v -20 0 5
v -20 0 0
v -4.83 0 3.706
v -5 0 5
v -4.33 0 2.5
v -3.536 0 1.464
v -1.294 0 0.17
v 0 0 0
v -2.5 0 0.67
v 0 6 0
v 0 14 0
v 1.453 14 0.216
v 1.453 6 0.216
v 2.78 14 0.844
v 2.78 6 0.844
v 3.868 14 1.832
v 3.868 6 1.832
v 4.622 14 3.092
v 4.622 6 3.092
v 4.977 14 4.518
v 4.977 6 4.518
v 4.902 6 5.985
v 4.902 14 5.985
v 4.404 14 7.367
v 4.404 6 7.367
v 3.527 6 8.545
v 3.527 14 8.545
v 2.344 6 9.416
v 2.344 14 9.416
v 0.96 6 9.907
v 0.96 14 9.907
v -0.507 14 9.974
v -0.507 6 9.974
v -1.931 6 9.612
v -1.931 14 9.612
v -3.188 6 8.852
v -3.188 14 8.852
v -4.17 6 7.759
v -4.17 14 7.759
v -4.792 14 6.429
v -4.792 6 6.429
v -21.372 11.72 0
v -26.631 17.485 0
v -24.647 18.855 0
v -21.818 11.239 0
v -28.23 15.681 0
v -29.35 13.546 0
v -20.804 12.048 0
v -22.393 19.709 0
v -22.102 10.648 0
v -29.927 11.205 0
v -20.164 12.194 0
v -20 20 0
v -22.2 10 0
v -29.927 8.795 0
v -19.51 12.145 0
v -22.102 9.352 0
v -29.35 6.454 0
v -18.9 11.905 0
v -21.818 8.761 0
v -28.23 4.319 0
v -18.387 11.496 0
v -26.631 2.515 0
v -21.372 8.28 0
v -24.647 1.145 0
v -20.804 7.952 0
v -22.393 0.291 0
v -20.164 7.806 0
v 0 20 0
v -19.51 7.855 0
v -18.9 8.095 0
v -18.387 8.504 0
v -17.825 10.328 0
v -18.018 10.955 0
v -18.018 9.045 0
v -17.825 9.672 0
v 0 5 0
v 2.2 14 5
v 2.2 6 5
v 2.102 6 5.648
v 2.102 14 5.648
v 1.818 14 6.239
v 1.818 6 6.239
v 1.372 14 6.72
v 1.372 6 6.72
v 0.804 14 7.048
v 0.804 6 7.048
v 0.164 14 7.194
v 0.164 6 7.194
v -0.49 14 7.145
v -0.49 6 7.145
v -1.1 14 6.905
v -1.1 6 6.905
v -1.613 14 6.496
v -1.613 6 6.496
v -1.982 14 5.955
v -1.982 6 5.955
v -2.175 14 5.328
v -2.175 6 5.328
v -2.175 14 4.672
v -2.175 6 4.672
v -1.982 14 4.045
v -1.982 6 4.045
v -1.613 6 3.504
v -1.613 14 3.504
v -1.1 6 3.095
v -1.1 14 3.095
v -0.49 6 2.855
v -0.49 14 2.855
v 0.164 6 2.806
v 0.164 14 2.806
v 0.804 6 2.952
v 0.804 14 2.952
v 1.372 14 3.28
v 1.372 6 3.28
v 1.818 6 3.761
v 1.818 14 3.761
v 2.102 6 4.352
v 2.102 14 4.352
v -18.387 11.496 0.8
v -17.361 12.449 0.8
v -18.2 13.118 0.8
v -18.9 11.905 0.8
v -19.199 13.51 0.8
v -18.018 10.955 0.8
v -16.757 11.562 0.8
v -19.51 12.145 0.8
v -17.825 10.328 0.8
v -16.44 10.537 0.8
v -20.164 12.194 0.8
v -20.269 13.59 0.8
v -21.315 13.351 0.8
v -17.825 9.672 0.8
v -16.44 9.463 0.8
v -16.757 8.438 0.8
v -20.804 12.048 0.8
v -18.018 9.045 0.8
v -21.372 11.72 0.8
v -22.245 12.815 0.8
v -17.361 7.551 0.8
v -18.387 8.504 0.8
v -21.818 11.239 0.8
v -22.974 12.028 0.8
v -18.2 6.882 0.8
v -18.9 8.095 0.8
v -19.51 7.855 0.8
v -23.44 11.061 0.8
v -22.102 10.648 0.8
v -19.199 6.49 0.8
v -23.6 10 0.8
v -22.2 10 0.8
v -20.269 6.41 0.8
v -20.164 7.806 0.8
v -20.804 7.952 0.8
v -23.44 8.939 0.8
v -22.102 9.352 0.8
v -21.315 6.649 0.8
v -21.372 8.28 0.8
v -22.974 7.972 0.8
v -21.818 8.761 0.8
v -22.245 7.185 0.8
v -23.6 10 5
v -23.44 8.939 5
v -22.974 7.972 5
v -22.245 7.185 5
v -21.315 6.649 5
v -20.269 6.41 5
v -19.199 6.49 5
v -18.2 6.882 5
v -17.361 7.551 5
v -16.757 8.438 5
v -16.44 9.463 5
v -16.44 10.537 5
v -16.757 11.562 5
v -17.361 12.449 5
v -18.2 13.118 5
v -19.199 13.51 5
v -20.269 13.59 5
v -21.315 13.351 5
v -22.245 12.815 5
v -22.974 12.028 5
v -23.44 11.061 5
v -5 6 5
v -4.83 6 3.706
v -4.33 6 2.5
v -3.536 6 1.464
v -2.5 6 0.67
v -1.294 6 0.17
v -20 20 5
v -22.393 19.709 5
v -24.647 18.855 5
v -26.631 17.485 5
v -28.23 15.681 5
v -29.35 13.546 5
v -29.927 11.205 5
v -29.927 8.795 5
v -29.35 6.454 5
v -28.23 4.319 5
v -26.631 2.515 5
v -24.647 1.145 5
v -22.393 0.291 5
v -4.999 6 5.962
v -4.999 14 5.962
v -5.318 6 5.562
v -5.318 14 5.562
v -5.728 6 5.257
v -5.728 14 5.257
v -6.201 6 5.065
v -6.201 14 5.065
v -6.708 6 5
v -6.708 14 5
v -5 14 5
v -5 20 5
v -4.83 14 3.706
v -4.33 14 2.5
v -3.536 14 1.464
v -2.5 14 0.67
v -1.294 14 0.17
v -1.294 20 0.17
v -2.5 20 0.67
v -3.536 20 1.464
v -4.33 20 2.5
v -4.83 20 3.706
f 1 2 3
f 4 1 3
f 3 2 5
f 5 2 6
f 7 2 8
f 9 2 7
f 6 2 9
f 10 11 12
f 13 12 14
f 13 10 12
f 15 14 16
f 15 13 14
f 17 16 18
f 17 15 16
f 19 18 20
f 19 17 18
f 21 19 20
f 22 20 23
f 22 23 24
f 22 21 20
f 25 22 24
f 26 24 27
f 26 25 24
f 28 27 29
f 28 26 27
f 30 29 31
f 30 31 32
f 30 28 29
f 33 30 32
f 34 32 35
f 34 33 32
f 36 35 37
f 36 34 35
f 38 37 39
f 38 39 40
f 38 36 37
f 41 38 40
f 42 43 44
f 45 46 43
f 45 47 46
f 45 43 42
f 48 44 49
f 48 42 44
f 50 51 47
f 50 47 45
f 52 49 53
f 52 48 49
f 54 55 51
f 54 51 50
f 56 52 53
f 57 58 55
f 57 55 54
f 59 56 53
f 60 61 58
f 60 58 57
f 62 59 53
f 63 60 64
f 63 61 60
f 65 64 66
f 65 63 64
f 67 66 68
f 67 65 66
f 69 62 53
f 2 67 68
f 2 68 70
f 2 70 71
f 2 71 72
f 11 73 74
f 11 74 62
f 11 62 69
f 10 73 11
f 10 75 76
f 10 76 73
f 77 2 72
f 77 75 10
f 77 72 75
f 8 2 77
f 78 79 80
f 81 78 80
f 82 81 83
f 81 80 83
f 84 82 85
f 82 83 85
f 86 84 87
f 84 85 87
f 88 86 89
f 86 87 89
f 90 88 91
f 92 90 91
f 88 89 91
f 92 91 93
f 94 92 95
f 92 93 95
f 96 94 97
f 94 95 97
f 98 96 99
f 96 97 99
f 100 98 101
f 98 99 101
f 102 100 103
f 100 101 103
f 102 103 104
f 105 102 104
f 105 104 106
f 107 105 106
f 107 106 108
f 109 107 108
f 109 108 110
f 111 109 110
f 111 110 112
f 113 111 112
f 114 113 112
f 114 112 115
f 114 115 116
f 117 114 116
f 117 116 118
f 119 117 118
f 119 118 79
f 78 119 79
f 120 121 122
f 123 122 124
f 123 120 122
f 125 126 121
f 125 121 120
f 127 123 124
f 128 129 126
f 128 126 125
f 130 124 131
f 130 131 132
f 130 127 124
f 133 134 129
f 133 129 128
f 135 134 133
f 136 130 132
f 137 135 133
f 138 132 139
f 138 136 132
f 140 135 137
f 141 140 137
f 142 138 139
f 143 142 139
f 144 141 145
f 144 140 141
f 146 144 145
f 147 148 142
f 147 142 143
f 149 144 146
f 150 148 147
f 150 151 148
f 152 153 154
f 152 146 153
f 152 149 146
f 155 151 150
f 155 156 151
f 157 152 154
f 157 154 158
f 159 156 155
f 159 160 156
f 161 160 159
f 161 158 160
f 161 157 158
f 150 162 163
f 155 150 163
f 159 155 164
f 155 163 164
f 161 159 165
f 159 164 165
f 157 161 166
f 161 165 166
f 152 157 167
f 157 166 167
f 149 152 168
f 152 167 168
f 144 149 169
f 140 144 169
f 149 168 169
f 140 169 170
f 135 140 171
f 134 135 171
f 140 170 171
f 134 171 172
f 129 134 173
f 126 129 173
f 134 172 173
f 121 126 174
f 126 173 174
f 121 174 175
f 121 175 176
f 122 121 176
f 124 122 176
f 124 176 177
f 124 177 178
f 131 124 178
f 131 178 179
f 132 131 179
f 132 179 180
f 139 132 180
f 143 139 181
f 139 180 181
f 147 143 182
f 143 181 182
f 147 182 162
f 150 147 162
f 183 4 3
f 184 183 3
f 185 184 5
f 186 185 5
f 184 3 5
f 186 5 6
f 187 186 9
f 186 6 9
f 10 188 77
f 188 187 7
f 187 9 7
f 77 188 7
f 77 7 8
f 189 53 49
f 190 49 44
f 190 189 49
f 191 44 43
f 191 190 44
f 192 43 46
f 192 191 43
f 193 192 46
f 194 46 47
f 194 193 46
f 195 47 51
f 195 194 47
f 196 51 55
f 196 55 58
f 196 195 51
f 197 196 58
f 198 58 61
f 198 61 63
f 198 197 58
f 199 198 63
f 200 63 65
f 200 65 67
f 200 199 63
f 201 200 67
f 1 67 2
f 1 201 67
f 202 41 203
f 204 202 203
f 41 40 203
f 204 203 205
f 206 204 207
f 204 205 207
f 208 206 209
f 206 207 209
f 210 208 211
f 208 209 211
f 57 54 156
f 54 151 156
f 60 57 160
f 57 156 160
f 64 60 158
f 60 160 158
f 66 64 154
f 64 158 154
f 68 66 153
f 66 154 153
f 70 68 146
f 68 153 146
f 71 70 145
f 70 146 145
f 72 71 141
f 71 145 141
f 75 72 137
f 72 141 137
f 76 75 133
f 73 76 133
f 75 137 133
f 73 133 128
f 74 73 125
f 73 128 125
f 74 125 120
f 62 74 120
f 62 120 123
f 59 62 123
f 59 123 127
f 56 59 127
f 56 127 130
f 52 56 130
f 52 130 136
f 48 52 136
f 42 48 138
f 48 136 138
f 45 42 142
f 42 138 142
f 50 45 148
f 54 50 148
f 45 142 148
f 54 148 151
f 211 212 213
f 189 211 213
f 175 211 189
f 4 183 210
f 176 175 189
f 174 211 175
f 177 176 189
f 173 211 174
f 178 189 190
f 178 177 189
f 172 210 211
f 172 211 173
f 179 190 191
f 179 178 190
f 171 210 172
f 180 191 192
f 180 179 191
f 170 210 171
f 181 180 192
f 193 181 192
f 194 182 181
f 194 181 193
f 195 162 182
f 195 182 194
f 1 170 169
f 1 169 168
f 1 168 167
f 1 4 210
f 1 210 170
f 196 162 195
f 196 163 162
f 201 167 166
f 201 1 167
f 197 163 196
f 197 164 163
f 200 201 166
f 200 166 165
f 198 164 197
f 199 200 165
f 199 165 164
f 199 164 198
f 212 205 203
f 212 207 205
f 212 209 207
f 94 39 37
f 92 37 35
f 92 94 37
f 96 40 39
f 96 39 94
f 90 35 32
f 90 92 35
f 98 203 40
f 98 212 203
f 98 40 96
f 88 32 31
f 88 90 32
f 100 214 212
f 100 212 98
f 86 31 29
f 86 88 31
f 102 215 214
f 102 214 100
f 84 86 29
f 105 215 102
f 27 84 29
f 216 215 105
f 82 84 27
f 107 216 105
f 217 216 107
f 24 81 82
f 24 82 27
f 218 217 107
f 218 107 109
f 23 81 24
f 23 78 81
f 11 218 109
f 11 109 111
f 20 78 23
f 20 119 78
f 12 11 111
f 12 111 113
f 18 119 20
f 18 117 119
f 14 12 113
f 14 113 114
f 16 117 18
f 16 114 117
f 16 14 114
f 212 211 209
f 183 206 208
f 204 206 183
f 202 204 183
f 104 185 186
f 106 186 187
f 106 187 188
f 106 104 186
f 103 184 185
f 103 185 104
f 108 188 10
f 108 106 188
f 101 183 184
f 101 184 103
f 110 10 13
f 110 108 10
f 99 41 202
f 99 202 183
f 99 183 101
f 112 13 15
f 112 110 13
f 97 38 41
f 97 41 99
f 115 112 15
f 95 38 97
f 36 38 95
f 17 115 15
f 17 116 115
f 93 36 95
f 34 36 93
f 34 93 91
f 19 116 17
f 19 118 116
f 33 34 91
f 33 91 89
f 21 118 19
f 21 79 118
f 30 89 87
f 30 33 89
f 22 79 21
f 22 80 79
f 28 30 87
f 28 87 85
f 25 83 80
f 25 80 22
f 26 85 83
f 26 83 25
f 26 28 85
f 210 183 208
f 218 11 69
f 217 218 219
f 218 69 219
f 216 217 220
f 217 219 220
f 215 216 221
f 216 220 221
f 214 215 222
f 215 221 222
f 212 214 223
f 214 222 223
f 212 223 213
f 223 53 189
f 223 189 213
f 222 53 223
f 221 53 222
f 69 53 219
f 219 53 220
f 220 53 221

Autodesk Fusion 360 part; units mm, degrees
sketch "Sketch1" plane through (0, 0, 0) normal (0, 1, 0) x (1, 0, 0)
  line L0 (-20, 0) -> (20, 0)
  line L1 (20, 0) -> (20, -5)
  line L2 (20, -5) -> (-20, -5)
  line L3 (-20, -5) -> (-20, 0)
  circle A0 centre (0, -5) radius 5
  circle A1 centre (0, -5) radius 3.6
  circle A2 centre (0, -5) radius 2.2
  dimension "d19" = 10
  dimension "d20" = 7.2
  dimension "d21" = 4.4
extrude "Extrude13" add sketch "Sketch1" along normal blind 20 contours L0 L2 L3 A0
extrude "Extrude14" add sketch "Sketch1" along normal blind 15 contours L2 A0 A1 | L2 A0 A1 | L2 A1 A2 | L2 A1 A2
sketch "Sketch8" plane through (0, 0, 0) normal (0, -1, 0) x (1, 0, 0)
  circle A0 centre (0, 5) radius 2.2
  line L0 (-20, 0) -> (0, 0)
  arc A1 (0, 0) -> (-5, 5) centre (0, 5) ccw
  line L1 (-5, 5) -> (-20, 5)
  circle A2 centre (0, 5) radius 5
  line L2 (-20, 5) -> (-20, 0)
extrude "Extrude15" cut sketch "Sketch8" against normal blind 5 contours A1 A2
extrude "Extrude21" cut 1 faces at (0.2994, 15, 0.9534) along direction (0, -1, 0) blind 1
extrude "Extrude22" cut 1 faces at (0.2994, 5, 0.9534) along direction (0, 1, 0) blind 1
sketch "Sketch12" plane through (0, 0, 5) normal (0, 0, 1) x (-1, 0, 0)
  line L0 (20, 0) -> (5, 0)
  line L1 (5, 0) -> (5, -6)
  line L2 (5, -6) -> (5, -14)
  line L3 (5, -14) -> (5, -20)
  line L4 (5, -20) -> (20, -20)
  line L5 (20, -20) -> (20, 0)
  circle A0 centre (20, -10) radius 10
  circle A1 centre (20, -10) radius 3.6
  circle A2 centre (20, -10) radius 2.2
  dimension "d92" = 20
  dimension "d95" = 7.2
  dimension "d96" = 4.4
extrude "Extrude24" add sketch "Sketch12" against normal blind 5 contours L5 A0 A1 | L5 A1 A2 | L5 A2 picked at (27.8205, -10.6452) picked at (23.1211, -10.1708) picked at (20.6671, -9.6954)
extrude "Extrude25" cut sketch "Sketch12" against normal blind 4.2 contours L5 A1 A2 | L5 A1 A2
extrude "Extrude26" cut sketch "Sketch12" against normal through all contours L5 A2 | L5 A2
fillet "Fillet13" radius 2 1 edges at (-5, 10, 5)
